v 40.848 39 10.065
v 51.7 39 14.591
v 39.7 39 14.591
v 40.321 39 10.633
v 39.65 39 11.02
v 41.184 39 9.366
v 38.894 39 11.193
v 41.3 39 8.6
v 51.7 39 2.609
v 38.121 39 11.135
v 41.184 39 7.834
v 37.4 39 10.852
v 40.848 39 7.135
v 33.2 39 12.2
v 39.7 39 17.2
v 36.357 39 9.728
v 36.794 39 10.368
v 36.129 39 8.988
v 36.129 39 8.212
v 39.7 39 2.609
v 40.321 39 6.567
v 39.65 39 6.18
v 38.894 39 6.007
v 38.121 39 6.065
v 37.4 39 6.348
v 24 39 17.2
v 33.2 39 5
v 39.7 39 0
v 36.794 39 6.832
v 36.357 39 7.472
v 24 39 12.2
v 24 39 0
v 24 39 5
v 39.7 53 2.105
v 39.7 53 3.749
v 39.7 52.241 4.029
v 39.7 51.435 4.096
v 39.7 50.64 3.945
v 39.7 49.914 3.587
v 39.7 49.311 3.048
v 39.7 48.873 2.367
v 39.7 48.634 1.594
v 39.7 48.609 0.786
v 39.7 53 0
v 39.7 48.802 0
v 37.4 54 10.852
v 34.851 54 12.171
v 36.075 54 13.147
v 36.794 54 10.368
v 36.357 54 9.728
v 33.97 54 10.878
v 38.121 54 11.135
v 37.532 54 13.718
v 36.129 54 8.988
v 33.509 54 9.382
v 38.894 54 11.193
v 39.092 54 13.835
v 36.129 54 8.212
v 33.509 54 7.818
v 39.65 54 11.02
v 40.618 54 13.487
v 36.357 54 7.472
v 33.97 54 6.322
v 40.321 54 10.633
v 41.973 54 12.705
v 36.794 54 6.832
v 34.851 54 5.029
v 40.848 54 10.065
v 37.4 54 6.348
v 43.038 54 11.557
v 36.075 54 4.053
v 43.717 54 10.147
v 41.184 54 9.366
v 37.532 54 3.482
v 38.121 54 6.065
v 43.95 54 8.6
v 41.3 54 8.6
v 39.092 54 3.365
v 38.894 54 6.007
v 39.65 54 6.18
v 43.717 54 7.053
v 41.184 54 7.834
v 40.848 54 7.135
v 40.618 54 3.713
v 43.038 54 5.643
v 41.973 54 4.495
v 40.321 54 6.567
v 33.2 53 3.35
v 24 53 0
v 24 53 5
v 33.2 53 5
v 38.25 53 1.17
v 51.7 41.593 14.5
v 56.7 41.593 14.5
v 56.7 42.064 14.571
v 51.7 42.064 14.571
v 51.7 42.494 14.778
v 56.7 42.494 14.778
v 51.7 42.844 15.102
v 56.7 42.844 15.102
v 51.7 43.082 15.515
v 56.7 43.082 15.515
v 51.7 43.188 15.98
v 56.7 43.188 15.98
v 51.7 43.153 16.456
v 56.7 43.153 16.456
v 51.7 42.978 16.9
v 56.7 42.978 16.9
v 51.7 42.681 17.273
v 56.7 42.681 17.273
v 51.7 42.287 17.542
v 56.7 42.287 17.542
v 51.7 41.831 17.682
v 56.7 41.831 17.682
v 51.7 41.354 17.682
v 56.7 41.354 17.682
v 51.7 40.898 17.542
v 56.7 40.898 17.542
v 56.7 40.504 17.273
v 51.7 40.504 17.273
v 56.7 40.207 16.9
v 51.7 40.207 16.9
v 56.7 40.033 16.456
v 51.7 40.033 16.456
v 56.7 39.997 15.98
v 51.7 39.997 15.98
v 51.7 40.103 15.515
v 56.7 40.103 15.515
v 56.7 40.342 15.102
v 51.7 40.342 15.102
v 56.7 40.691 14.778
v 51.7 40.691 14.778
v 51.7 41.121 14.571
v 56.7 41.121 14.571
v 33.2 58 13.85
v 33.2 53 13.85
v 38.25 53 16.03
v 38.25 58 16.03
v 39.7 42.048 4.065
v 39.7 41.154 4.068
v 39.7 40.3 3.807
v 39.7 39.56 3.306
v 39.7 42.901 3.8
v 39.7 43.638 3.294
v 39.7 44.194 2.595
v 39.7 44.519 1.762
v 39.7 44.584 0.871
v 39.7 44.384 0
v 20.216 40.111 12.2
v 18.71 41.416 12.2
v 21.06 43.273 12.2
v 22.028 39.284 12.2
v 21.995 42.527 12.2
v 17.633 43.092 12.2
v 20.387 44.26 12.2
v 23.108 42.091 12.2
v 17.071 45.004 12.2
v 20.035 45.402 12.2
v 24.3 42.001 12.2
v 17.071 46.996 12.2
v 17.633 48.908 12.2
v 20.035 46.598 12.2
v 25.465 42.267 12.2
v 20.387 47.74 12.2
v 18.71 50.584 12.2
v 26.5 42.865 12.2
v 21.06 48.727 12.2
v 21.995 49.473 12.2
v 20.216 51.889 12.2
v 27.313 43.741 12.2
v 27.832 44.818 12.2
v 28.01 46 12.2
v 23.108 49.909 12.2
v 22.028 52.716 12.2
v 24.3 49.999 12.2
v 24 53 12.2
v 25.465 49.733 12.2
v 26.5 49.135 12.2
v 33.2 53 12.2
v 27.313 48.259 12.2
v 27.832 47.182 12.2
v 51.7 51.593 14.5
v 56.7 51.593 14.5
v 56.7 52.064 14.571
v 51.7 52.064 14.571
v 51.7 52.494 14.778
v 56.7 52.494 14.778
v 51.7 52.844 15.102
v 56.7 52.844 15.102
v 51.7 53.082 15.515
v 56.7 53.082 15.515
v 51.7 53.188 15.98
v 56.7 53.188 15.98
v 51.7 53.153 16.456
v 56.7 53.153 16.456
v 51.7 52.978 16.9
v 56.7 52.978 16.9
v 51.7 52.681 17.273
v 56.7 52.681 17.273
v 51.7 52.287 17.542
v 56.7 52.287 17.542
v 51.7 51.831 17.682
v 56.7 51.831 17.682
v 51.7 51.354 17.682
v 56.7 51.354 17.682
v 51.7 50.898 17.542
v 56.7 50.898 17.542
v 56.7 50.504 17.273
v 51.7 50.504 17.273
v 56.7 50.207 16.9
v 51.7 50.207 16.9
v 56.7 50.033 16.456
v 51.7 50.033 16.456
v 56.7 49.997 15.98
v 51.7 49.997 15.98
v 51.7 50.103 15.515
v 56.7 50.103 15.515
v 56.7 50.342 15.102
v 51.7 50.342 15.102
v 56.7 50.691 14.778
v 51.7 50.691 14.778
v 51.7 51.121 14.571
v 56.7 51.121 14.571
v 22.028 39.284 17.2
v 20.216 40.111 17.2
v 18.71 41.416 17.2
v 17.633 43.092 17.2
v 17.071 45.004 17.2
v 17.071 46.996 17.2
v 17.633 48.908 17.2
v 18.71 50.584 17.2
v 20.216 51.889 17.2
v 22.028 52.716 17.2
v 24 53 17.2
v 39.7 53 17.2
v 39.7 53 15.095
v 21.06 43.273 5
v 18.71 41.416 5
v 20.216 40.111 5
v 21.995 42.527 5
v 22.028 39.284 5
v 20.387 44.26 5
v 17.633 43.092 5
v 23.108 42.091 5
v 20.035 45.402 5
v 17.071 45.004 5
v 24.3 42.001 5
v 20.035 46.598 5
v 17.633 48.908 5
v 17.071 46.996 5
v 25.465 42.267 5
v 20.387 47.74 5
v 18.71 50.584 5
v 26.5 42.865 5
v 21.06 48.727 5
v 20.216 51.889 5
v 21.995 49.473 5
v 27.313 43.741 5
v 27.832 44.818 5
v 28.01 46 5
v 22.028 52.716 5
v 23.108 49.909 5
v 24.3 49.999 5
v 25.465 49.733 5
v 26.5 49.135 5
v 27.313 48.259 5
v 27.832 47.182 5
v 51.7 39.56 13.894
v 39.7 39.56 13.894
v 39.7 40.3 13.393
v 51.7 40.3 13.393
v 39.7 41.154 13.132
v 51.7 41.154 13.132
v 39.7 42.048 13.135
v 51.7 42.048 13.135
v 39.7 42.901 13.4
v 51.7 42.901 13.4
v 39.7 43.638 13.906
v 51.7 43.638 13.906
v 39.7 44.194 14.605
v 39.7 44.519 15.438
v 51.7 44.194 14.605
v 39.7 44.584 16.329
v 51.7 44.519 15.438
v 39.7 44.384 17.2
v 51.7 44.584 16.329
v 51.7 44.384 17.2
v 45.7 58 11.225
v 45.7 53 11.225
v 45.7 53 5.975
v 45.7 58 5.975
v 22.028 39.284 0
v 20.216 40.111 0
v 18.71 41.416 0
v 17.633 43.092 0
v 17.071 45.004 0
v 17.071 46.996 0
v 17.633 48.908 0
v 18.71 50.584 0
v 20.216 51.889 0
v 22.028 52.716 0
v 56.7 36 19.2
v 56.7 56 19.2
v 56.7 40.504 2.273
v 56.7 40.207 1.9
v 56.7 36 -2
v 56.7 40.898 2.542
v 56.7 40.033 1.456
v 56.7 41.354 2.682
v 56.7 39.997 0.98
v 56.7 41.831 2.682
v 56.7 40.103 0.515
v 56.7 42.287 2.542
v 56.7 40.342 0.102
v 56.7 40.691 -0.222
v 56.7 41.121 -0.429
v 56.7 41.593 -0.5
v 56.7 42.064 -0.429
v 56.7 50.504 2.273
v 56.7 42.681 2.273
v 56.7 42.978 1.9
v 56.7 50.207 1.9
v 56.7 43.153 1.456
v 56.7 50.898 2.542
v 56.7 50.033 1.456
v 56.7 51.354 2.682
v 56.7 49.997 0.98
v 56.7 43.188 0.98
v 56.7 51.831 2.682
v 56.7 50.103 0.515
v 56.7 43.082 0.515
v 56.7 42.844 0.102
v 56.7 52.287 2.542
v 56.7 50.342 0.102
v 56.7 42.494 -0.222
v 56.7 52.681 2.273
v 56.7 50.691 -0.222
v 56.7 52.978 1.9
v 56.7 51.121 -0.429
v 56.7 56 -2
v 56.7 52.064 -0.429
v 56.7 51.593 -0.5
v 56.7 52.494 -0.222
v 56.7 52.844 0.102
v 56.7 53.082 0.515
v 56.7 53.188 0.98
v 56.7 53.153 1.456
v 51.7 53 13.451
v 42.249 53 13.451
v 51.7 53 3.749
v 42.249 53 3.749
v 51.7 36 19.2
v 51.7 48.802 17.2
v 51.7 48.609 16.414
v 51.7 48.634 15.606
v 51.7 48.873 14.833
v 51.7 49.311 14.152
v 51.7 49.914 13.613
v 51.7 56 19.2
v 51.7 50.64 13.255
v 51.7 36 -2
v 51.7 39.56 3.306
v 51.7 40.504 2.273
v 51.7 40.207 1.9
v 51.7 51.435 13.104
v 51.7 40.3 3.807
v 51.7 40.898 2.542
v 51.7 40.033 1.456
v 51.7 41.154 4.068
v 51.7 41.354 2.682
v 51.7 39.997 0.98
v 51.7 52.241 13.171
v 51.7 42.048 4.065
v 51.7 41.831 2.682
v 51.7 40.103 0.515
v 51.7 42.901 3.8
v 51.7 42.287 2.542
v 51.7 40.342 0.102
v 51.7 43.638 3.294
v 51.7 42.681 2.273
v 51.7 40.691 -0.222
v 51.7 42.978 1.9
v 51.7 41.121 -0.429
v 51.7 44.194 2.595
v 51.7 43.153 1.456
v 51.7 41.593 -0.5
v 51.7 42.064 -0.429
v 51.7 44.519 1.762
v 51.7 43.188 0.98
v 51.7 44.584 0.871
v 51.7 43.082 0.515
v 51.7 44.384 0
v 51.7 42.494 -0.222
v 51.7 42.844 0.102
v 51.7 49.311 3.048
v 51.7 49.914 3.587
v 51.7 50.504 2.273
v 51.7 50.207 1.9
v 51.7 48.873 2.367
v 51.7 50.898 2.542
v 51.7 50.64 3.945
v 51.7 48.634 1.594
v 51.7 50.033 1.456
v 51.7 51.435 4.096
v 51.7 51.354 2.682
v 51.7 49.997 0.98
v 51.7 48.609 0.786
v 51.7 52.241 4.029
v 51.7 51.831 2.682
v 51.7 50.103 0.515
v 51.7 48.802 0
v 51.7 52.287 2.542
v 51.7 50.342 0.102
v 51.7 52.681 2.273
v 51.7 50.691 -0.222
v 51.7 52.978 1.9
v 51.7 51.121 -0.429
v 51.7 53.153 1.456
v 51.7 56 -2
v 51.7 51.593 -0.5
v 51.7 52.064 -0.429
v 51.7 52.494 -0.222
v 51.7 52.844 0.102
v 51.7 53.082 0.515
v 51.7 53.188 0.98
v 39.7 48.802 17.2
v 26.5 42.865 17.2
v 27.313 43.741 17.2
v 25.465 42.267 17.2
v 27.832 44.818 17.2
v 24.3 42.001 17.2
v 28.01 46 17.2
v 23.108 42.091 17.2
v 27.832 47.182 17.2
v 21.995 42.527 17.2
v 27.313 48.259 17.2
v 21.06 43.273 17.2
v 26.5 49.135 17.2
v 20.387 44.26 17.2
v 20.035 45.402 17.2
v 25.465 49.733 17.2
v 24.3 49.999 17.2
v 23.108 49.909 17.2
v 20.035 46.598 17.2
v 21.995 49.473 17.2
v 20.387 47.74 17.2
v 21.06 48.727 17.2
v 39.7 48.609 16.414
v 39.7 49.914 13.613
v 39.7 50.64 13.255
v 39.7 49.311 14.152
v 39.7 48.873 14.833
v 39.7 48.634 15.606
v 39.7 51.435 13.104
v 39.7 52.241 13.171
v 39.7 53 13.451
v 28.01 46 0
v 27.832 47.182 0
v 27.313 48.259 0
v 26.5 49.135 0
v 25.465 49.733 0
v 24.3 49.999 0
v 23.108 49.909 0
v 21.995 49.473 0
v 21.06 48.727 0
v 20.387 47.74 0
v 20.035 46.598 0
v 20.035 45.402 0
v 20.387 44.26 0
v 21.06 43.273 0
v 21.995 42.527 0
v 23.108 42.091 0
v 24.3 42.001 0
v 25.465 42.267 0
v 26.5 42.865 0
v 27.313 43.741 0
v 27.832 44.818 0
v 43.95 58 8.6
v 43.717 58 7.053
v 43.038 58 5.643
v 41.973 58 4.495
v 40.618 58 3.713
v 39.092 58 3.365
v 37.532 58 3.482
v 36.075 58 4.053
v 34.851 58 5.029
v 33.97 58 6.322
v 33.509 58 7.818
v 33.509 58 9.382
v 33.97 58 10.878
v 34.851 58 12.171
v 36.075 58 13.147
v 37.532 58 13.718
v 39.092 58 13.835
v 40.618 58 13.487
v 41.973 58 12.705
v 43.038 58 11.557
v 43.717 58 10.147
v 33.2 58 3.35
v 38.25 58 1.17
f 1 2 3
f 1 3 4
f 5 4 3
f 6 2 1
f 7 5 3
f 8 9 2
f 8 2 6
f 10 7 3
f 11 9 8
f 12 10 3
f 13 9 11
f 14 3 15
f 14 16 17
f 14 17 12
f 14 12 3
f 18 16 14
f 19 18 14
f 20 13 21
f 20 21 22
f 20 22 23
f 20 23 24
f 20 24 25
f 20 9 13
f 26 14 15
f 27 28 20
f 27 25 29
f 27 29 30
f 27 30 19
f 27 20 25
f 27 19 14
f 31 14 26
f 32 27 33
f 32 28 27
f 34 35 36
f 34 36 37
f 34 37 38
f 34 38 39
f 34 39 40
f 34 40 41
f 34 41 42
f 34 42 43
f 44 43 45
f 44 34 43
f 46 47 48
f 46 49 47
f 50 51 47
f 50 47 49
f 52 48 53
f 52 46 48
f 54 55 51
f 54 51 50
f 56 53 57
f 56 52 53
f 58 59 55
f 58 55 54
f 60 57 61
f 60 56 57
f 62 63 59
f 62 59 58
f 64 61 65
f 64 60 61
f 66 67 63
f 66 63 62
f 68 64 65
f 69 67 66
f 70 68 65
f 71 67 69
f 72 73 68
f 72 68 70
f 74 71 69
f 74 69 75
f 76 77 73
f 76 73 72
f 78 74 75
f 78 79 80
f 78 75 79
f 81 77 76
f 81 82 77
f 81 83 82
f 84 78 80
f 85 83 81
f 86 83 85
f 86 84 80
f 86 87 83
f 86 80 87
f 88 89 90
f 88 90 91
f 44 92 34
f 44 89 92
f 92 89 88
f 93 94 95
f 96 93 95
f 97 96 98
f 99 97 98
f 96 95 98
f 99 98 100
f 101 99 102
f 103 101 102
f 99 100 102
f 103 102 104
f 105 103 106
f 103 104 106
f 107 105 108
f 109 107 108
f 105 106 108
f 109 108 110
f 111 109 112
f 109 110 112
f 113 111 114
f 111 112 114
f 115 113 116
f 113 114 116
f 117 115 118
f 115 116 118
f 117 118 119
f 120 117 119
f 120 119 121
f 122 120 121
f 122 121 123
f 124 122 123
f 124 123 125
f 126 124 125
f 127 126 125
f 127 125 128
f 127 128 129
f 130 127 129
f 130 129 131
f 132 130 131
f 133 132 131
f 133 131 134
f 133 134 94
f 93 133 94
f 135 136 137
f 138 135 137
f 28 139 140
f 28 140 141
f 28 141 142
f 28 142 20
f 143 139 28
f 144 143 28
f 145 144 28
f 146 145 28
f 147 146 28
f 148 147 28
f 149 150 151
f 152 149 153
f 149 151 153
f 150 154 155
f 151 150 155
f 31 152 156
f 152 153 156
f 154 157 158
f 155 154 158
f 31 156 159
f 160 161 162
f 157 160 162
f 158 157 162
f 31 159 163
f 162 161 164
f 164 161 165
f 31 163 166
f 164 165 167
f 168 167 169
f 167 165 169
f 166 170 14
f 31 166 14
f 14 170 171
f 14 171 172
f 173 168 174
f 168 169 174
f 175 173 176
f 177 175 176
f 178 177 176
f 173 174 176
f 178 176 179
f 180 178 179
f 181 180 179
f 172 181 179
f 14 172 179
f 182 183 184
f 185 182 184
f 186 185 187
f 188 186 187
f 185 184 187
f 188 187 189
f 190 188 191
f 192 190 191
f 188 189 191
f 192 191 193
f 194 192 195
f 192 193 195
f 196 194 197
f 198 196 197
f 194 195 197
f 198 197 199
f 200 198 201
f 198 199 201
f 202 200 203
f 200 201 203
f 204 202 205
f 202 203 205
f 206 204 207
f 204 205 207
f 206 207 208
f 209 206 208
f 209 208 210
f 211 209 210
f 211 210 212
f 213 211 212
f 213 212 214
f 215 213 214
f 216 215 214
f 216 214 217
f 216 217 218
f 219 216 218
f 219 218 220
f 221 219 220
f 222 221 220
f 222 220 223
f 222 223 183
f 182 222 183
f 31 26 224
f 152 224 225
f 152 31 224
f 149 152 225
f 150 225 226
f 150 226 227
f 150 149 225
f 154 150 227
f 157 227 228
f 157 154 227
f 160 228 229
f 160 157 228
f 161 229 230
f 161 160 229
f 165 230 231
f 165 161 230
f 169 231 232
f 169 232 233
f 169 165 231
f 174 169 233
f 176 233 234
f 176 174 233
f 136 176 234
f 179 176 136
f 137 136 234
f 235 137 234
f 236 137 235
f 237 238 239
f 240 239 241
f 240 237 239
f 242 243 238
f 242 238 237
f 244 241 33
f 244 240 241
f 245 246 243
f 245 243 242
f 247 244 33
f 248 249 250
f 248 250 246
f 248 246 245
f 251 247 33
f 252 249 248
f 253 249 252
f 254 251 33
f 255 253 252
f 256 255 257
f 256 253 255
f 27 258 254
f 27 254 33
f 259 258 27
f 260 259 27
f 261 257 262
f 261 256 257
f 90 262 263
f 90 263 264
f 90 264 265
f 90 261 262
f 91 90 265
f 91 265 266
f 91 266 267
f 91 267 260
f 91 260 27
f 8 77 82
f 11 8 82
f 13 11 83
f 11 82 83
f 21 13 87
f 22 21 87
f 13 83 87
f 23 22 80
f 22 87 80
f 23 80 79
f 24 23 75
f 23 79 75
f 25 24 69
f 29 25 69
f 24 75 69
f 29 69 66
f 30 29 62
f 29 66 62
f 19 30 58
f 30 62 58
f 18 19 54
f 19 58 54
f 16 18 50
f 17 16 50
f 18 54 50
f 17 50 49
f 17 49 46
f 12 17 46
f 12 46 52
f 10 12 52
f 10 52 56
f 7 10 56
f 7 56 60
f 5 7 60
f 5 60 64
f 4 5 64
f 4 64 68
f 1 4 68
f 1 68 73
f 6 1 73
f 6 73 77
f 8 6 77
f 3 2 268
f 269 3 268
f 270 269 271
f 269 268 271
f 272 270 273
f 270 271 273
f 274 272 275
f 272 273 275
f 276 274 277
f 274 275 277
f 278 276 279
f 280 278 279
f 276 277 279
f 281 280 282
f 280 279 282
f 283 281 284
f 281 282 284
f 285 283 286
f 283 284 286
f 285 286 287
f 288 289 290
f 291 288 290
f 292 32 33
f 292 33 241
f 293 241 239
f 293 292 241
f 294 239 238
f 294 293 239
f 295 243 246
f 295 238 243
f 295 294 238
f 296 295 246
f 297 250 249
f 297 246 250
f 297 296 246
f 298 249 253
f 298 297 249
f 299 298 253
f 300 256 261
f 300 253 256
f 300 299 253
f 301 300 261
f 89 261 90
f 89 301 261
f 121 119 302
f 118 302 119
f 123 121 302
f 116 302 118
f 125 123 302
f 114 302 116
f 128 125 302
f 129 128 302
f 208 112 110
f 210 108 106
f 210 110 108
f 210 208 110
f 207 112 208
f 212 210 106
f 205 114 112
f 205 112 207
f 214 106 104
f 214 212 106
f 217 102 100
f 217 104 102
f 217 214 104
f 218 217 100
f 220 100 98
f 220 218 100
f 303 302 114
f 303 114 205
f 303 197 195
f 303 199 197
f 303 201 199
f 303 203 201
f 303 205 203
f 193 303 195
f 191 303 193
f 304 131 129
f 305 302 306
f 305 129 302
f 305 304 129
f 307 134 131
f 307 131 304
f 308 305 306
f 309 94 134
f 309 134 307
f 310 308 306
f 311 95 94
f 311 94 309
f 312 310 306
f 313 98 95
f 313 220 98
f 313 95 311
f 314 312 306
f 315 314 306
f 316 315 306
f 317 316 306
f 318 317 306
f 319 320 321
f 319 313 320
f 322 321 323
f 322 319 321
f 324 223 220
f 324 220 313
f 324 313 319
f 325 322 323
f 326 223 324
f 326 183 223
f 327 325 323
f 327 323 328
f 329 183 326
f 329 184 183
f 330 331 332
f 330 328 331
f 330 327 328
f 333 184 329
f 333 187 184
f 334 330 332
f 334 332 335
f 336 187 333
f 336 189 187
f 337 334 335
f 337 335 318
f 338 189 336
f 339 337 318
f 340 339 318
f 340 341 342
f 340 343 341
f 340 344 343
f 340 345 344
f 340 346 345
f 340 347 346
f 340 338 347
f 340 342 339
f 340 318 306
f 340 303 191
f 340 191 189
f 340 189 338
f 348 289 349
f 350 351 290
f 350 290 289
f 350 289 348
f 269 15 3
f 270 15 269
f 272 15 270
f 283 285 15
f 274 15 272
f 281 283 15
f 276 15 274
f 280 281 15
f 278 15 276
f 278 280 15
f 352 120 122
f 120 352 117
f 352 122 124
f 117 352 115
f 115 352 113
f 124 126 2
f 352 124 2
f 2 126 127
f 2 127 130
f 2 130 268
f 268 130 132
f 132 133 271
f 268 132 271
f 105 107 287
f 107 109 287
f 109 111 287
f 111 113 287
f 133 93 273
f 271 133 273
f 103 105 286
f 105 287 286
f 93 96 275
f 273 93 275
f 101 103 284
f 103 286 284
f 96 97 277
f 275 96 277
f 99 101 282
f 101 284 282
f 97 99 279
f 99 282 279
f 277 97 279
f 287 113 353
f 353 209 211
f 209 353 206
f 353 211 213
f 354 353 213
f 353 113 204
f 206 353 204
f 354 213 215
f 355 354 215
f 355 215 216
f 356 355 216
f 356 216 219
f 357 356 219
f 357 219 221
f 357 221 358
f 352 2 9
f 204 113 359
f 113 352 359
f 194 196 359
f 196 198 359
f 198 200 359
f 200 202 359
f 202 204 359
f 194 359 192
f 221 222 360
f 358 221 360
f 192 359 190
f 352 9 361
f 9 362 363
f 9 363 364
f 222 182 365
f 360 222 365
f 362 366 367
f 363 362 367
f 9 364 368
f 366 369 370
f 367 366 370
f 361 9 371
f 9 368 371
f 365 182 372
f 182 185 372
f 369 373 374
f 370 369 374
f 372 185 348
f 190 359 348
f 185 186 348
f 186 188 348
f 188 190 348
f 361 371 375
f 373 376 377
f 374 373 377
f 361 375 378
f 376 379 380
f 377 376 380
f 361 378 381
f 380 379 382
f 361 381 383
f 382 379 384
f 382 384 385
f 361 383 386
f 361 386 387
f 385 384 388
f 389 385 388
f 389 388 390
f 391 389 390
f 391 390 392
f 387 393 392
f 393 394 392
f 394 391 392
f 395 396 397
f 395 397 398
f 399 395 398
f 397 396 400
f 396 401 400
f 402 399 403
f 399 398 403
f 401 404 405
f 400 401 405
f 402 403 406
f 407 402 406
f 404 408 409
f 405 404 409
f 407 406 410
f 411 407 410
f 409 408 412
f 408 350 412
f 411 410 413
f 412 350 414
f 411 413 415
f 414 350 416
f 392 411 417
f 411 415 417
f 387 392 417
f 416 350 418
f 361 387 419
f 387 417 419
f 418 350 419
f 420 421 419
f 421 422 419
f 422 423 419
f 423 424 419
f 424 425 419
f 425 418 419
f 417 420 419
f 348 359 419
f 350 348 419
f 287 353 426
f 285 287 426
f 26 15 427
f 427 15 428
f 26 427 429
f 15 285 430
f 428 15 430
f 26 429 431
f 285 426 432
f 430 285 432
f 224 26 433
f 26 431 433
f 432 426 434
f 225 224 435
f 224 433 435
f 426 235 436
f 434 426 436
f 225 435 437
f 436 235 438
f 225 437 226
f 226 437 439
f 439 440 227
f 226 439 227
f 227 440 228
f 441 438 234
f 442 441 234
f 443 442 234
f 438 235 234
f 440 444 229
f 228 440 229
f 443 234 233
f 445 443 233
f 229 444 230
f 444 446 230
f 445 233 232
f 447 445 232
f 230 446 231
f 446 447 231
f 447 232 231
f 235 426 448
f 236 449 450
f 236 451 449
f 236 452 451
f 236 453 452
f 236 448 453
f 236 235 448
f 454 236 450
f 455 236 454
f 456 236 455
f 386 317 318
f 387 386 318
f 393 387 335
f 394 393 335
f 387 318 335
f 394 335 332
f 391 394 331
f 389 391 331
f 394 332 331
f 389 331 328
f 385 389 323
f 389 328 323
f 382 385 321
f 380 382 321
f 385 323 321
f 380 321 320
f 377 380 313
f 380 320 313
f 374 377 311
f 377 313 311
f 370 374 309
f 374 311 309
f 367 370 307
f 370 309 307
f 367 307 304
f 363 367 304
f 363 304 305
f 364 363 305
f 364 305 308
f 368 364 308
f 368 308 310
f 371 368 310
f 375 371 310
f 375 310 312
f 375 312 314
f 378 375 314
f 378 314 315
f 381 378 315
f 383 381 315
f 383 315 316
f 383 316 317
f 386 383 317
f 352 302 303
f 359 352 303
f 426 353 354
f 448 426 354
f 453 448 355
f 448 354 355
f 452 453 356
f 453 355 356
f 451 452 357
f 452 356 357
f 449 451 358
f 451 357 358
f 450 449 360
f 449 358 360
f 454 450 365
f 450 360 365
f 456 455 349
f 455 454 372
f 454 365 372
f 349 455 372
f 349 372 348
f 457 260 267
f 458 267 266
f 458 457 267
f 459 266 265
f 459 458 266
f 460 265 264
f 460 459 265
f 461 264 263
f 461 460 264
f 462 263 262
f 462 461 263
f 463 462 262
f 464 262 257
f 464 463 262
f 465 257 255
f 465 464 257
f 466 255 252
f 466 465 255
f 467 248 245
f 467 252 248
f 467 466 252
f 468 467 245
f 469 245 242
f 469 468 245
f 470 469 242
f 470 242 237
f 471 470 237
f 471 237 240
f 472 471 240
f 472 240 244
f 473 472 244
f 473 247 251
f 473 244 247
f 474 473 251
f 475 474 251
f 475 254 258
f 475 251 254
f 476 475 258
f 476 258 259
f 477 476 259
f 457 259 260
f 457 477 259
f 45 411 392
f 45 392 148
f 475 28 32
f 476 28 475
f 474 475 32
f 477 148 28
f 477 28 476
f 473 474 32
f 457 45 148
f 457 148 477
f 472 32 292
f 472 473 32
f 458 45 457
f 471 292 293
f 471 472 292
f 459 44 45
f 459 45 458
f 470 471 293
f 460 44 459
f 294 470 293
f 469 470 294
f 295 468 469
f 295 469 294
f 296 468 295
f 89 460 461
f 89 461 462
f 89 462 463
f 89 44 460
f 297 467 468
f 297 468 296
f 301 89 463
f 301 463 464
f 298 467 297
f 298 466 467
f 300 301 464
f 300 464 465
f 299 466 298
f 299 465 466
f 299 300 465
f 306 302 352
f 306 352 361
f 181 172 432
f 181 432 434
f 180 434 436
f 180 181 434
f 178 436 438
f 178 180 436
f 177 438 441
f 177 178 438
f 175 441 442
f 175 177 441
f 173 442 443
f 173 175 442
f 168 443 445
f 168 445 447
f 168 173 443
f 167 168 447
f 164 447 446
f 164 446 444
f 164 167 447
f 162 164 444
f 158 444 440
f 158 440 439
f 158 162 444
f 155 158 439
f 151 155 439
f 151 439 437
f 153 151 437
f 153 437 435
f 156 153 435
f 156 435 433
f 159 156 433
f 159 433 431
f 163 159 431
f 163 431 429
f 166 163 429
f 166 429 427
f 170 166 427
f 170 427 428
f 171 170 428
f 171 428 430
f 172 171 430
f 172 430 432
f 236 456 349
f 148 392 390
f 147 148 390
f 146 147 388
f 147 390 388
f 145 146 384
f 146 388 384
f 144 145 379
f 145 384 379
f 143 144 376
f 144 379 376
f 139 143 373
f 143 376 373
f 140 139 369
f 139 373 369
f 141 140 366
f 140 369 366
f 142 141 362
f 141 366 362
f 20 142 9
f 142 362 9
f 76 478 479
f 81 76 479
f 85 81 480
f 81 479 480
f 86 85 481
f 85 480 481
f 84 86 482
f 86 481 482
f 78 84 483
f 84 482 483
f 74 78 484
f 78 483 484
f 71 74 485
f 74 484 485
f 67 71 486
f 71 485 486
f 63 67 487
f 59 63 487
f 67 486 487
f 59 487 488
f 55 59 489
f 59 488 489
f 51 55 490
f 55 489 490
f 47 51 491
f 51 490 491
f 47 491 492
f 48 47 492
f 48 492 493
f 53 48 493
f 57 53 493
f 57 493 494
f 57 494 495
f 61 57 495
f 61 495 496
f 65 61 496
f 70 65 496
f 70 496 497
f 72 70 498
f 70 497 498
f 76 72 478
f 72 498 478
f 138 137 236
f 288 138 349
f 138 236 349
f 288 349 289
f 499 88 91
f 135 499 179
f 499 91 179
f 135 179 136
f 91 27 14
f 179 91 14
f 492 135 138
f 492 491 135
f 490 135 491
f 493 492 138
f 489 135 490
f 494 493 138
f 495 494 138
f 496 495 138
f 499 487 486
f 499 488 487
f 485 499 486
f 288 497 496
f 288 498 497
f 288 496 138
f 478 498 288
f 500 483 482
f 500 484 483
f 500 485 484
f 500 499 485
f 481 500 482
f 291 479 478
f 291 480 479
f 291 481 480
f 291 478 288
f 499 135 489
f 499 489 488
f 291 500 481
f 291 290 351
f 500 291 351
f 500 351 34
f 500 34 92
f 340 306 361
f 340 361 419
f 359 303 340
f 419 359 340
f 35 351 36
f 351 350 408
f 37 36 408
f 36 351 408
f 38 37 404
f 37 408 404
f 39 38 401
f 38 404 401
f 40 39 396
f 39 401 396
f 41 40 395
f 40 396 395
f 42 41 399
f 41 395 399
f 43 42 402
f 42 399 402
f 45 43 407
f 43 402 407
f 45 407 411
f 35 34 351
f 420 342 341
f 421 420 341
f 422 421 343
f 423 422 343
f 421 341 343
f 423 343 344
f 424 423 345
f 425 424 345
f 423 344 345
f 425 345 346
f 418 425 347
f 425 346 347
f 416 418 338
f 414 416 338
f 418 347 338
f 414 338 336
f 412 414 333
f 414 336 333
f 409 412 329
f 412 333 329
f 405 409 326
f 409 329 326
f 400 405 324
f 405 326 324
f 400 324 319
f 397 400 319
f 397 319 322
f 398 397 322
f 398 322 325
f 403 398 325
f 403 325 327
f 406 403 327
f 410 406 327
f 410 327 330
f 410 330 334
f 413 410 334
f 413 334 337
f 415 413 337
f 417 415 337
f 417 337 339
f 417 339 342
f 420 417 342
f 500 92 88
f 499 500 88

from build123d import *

# Parameters (mm, degrees)
SKETCH_1_R          = 4.01
EXTRUDE_1_DEPTH     = 17.2
SKETCH_2_W          = 16.2
SKETCH_2_H          = 7.2
CUT_EXTRUDE_1_DEPTH = 18
SKETCH_4_W          = 2
SKETCH_4_H          = 20
EXTRUDE_2_DEPTH     = 5
SKETCH_3_R          = 1.6
CUT_EXTRUDE_2_DEPTH = 5
CUT_EXTRUDE_START   = -5
SKETCH_5_R          = 3
CUT_EXTRUDE_3_DEPTH = 12
EXTRUDE_7_DEPTH     = 5
SKETCH_7_R          = 5.25
CUT_EXTRUDE_8_DEPTH = 4
CUT_EXTRUDE_9_REACH = 20
SKETCH_8_R          = 2.6


with BuildPart() as part:
    # ｽｹｯﾁ1 → ﾎﾞｽ - 押し出し1 (new body)
    with BuildSketch(Plane.XY):
        with BuildLine():
            Line((24, 53), (51.7, 53))
            Line((51.7, 53), (51.7, 56))
            Line((51.7, 56), (56.7, 56))
            Line((56.7, 56), (56.7, 36))
            Line((56.7, 36), (51.7, 36))
            Line((51.7, 36), (51.7, 39))
            Line((51.7, 39), (24, 39))
            ThreePointArc((24, 39), (17, 46), (24, 53))
        make_face()
        with Locations((24, 46)):
            Circle(SKETCH_1_R, mode=Mode.SUBTRACT)
    extrude(amount=EXTRUDE_1_DEPTH)

    # ｽｹｯﾁ2 → ｶｯﾄ - 押し出し1 (cut, through all)
    with BuildSketch(Plane(origin=(0, 53, 0), x_dir=(1, 0, 0), z_dir=(0, 1, 0))):
        with Locations((25.1, -8.6)):
            Rectangle(SKETCH_2_W, SKETCH_2_H)
    extrude(amount=-CUT_EXTRUDE_1_DEPTH, mode=Mode.SUBTRACT)

    # ｽｹｯﾁ4 → ﾎﾞｽ - 押し出し2 (add)
    with BuildSketch(Plane(origin=(56.7, 0, 0), x_dir=(0, 0, -1), z_dir=(1, 0, 0))):
        with Locations((-18.2, 46)):
            Rectangle(SKETCH_4_W, SKETCH_4_H)
        with Locations((1, 46)):
            Rectangle(SKETCH_4_W, SKETCH_4_H)
    extrude(amount=-EXTRUDE_2_DEPTH)

    # ｽｹｯﾁ3 → ｶｯﾄ - 押し出し2 (cut)
    with BuildSketch(Plane(origin=(56.7, 0, 0), x_dir=(0, 0, -1), z_dir=(1, 0, 0))):
        with Locations((-16.1, 51.592630867)):
            Circle(SKETCH_3_R)
        with Locations((-1.1, 51.592630867)):
            Circle(SKETCH_3_R)
        with Locations((-16.1, 41.592630867)):
            Circle(SKETCH_3_R)
        with Locations((-1.1, 41.592630867)):
            Circle(SKETCH_3_R)
    extrude(amount=-CUT_EXTRUDE_2_DEPTH, mode=Mode.SUBTRACT)

    # ｽｹｯﾁ5 → ｶｯﾄ - 押し出し3 (cut)
    with BuildSketch(Plane(origin=(56.7, 0, 0), x_dir=(0, 0, -1), z_dir=(1, 0, 0)).offset(CUT_EXTRUDE_START)):
        with Locations((-16.1, 51.592630867)):
            Circle(SKETCH_5_R)
        with Locations((-16.1, 41.592630867)):
            Circle(SKETCH_5_R)
        with Locations((-1.1, 51.592630867)):
            Circle(SKETCH_5_R)
        with Locations((-1.1, 41.592630867)):
            Circle(SKETCH_5_R)
    extrude(amount=-CUT_EXTRUDE_3_DEPTH, mode=Mode.SUBTRACT)

    # ｽｹｯﾁ6 → ﾎﾞｽ - 押し出し7 (add)
    with BuildSketch(Plane(origin=(0, 53, 0), x_dir=(1, 0, 0), z_dir=(0, 1, 0))):
        Polygon((33.2, -3.35), (33.2, -13.85), (38.249508532, -16.030014583), (45.7, -11.225178721), (45.7, -5.974821279), (38.249508532, -1.169985417), align=None)
    extrude(amount=EXTRUDE_7_DEPTH)

    # ｽｹｯﾁ7 → ｶｯﾄ - 押し出し8 (cut)
    with BuildSketch(Plane(origin=(0, 58, 0), x_dir=(1, 0, 0), z_dir=(0, 1, 0))):
        with Locations((38.7, -8.6)):
            Circle(SKETCH_7_R)
    extrude(amount=-CUT_EXTRUDE_8_DEPTH, mode=Mode.SUBTRACT)

    # ｽｹｯﾁ8 → ｶｯﾄ - 押し出し9 (cut, up to next)
    with BuildSketch(Plane(origin=(0, 54, 0), x_dir=(1, 0, 0), z_dir=(0, 1, 0)), mode=Mode.PRIVATE) as cut_extrude_9_sk1:
        with Locations((38.7, -8.6)):
            Circle(SKETCH_8_R)
    cut_extrude_9_tool1 = extrude(cut_extrude_9_sk1.sketch, amount=-CUT_EXTRUDE_9_REACH, mode=Mode.PRIVATE) & part.part
    add(cut_extrude_9_tool1.solids().sort_by_distance((38.7, 54, 8.6))[0], mode=Mode.SUBTRACT)


solid = part.part
